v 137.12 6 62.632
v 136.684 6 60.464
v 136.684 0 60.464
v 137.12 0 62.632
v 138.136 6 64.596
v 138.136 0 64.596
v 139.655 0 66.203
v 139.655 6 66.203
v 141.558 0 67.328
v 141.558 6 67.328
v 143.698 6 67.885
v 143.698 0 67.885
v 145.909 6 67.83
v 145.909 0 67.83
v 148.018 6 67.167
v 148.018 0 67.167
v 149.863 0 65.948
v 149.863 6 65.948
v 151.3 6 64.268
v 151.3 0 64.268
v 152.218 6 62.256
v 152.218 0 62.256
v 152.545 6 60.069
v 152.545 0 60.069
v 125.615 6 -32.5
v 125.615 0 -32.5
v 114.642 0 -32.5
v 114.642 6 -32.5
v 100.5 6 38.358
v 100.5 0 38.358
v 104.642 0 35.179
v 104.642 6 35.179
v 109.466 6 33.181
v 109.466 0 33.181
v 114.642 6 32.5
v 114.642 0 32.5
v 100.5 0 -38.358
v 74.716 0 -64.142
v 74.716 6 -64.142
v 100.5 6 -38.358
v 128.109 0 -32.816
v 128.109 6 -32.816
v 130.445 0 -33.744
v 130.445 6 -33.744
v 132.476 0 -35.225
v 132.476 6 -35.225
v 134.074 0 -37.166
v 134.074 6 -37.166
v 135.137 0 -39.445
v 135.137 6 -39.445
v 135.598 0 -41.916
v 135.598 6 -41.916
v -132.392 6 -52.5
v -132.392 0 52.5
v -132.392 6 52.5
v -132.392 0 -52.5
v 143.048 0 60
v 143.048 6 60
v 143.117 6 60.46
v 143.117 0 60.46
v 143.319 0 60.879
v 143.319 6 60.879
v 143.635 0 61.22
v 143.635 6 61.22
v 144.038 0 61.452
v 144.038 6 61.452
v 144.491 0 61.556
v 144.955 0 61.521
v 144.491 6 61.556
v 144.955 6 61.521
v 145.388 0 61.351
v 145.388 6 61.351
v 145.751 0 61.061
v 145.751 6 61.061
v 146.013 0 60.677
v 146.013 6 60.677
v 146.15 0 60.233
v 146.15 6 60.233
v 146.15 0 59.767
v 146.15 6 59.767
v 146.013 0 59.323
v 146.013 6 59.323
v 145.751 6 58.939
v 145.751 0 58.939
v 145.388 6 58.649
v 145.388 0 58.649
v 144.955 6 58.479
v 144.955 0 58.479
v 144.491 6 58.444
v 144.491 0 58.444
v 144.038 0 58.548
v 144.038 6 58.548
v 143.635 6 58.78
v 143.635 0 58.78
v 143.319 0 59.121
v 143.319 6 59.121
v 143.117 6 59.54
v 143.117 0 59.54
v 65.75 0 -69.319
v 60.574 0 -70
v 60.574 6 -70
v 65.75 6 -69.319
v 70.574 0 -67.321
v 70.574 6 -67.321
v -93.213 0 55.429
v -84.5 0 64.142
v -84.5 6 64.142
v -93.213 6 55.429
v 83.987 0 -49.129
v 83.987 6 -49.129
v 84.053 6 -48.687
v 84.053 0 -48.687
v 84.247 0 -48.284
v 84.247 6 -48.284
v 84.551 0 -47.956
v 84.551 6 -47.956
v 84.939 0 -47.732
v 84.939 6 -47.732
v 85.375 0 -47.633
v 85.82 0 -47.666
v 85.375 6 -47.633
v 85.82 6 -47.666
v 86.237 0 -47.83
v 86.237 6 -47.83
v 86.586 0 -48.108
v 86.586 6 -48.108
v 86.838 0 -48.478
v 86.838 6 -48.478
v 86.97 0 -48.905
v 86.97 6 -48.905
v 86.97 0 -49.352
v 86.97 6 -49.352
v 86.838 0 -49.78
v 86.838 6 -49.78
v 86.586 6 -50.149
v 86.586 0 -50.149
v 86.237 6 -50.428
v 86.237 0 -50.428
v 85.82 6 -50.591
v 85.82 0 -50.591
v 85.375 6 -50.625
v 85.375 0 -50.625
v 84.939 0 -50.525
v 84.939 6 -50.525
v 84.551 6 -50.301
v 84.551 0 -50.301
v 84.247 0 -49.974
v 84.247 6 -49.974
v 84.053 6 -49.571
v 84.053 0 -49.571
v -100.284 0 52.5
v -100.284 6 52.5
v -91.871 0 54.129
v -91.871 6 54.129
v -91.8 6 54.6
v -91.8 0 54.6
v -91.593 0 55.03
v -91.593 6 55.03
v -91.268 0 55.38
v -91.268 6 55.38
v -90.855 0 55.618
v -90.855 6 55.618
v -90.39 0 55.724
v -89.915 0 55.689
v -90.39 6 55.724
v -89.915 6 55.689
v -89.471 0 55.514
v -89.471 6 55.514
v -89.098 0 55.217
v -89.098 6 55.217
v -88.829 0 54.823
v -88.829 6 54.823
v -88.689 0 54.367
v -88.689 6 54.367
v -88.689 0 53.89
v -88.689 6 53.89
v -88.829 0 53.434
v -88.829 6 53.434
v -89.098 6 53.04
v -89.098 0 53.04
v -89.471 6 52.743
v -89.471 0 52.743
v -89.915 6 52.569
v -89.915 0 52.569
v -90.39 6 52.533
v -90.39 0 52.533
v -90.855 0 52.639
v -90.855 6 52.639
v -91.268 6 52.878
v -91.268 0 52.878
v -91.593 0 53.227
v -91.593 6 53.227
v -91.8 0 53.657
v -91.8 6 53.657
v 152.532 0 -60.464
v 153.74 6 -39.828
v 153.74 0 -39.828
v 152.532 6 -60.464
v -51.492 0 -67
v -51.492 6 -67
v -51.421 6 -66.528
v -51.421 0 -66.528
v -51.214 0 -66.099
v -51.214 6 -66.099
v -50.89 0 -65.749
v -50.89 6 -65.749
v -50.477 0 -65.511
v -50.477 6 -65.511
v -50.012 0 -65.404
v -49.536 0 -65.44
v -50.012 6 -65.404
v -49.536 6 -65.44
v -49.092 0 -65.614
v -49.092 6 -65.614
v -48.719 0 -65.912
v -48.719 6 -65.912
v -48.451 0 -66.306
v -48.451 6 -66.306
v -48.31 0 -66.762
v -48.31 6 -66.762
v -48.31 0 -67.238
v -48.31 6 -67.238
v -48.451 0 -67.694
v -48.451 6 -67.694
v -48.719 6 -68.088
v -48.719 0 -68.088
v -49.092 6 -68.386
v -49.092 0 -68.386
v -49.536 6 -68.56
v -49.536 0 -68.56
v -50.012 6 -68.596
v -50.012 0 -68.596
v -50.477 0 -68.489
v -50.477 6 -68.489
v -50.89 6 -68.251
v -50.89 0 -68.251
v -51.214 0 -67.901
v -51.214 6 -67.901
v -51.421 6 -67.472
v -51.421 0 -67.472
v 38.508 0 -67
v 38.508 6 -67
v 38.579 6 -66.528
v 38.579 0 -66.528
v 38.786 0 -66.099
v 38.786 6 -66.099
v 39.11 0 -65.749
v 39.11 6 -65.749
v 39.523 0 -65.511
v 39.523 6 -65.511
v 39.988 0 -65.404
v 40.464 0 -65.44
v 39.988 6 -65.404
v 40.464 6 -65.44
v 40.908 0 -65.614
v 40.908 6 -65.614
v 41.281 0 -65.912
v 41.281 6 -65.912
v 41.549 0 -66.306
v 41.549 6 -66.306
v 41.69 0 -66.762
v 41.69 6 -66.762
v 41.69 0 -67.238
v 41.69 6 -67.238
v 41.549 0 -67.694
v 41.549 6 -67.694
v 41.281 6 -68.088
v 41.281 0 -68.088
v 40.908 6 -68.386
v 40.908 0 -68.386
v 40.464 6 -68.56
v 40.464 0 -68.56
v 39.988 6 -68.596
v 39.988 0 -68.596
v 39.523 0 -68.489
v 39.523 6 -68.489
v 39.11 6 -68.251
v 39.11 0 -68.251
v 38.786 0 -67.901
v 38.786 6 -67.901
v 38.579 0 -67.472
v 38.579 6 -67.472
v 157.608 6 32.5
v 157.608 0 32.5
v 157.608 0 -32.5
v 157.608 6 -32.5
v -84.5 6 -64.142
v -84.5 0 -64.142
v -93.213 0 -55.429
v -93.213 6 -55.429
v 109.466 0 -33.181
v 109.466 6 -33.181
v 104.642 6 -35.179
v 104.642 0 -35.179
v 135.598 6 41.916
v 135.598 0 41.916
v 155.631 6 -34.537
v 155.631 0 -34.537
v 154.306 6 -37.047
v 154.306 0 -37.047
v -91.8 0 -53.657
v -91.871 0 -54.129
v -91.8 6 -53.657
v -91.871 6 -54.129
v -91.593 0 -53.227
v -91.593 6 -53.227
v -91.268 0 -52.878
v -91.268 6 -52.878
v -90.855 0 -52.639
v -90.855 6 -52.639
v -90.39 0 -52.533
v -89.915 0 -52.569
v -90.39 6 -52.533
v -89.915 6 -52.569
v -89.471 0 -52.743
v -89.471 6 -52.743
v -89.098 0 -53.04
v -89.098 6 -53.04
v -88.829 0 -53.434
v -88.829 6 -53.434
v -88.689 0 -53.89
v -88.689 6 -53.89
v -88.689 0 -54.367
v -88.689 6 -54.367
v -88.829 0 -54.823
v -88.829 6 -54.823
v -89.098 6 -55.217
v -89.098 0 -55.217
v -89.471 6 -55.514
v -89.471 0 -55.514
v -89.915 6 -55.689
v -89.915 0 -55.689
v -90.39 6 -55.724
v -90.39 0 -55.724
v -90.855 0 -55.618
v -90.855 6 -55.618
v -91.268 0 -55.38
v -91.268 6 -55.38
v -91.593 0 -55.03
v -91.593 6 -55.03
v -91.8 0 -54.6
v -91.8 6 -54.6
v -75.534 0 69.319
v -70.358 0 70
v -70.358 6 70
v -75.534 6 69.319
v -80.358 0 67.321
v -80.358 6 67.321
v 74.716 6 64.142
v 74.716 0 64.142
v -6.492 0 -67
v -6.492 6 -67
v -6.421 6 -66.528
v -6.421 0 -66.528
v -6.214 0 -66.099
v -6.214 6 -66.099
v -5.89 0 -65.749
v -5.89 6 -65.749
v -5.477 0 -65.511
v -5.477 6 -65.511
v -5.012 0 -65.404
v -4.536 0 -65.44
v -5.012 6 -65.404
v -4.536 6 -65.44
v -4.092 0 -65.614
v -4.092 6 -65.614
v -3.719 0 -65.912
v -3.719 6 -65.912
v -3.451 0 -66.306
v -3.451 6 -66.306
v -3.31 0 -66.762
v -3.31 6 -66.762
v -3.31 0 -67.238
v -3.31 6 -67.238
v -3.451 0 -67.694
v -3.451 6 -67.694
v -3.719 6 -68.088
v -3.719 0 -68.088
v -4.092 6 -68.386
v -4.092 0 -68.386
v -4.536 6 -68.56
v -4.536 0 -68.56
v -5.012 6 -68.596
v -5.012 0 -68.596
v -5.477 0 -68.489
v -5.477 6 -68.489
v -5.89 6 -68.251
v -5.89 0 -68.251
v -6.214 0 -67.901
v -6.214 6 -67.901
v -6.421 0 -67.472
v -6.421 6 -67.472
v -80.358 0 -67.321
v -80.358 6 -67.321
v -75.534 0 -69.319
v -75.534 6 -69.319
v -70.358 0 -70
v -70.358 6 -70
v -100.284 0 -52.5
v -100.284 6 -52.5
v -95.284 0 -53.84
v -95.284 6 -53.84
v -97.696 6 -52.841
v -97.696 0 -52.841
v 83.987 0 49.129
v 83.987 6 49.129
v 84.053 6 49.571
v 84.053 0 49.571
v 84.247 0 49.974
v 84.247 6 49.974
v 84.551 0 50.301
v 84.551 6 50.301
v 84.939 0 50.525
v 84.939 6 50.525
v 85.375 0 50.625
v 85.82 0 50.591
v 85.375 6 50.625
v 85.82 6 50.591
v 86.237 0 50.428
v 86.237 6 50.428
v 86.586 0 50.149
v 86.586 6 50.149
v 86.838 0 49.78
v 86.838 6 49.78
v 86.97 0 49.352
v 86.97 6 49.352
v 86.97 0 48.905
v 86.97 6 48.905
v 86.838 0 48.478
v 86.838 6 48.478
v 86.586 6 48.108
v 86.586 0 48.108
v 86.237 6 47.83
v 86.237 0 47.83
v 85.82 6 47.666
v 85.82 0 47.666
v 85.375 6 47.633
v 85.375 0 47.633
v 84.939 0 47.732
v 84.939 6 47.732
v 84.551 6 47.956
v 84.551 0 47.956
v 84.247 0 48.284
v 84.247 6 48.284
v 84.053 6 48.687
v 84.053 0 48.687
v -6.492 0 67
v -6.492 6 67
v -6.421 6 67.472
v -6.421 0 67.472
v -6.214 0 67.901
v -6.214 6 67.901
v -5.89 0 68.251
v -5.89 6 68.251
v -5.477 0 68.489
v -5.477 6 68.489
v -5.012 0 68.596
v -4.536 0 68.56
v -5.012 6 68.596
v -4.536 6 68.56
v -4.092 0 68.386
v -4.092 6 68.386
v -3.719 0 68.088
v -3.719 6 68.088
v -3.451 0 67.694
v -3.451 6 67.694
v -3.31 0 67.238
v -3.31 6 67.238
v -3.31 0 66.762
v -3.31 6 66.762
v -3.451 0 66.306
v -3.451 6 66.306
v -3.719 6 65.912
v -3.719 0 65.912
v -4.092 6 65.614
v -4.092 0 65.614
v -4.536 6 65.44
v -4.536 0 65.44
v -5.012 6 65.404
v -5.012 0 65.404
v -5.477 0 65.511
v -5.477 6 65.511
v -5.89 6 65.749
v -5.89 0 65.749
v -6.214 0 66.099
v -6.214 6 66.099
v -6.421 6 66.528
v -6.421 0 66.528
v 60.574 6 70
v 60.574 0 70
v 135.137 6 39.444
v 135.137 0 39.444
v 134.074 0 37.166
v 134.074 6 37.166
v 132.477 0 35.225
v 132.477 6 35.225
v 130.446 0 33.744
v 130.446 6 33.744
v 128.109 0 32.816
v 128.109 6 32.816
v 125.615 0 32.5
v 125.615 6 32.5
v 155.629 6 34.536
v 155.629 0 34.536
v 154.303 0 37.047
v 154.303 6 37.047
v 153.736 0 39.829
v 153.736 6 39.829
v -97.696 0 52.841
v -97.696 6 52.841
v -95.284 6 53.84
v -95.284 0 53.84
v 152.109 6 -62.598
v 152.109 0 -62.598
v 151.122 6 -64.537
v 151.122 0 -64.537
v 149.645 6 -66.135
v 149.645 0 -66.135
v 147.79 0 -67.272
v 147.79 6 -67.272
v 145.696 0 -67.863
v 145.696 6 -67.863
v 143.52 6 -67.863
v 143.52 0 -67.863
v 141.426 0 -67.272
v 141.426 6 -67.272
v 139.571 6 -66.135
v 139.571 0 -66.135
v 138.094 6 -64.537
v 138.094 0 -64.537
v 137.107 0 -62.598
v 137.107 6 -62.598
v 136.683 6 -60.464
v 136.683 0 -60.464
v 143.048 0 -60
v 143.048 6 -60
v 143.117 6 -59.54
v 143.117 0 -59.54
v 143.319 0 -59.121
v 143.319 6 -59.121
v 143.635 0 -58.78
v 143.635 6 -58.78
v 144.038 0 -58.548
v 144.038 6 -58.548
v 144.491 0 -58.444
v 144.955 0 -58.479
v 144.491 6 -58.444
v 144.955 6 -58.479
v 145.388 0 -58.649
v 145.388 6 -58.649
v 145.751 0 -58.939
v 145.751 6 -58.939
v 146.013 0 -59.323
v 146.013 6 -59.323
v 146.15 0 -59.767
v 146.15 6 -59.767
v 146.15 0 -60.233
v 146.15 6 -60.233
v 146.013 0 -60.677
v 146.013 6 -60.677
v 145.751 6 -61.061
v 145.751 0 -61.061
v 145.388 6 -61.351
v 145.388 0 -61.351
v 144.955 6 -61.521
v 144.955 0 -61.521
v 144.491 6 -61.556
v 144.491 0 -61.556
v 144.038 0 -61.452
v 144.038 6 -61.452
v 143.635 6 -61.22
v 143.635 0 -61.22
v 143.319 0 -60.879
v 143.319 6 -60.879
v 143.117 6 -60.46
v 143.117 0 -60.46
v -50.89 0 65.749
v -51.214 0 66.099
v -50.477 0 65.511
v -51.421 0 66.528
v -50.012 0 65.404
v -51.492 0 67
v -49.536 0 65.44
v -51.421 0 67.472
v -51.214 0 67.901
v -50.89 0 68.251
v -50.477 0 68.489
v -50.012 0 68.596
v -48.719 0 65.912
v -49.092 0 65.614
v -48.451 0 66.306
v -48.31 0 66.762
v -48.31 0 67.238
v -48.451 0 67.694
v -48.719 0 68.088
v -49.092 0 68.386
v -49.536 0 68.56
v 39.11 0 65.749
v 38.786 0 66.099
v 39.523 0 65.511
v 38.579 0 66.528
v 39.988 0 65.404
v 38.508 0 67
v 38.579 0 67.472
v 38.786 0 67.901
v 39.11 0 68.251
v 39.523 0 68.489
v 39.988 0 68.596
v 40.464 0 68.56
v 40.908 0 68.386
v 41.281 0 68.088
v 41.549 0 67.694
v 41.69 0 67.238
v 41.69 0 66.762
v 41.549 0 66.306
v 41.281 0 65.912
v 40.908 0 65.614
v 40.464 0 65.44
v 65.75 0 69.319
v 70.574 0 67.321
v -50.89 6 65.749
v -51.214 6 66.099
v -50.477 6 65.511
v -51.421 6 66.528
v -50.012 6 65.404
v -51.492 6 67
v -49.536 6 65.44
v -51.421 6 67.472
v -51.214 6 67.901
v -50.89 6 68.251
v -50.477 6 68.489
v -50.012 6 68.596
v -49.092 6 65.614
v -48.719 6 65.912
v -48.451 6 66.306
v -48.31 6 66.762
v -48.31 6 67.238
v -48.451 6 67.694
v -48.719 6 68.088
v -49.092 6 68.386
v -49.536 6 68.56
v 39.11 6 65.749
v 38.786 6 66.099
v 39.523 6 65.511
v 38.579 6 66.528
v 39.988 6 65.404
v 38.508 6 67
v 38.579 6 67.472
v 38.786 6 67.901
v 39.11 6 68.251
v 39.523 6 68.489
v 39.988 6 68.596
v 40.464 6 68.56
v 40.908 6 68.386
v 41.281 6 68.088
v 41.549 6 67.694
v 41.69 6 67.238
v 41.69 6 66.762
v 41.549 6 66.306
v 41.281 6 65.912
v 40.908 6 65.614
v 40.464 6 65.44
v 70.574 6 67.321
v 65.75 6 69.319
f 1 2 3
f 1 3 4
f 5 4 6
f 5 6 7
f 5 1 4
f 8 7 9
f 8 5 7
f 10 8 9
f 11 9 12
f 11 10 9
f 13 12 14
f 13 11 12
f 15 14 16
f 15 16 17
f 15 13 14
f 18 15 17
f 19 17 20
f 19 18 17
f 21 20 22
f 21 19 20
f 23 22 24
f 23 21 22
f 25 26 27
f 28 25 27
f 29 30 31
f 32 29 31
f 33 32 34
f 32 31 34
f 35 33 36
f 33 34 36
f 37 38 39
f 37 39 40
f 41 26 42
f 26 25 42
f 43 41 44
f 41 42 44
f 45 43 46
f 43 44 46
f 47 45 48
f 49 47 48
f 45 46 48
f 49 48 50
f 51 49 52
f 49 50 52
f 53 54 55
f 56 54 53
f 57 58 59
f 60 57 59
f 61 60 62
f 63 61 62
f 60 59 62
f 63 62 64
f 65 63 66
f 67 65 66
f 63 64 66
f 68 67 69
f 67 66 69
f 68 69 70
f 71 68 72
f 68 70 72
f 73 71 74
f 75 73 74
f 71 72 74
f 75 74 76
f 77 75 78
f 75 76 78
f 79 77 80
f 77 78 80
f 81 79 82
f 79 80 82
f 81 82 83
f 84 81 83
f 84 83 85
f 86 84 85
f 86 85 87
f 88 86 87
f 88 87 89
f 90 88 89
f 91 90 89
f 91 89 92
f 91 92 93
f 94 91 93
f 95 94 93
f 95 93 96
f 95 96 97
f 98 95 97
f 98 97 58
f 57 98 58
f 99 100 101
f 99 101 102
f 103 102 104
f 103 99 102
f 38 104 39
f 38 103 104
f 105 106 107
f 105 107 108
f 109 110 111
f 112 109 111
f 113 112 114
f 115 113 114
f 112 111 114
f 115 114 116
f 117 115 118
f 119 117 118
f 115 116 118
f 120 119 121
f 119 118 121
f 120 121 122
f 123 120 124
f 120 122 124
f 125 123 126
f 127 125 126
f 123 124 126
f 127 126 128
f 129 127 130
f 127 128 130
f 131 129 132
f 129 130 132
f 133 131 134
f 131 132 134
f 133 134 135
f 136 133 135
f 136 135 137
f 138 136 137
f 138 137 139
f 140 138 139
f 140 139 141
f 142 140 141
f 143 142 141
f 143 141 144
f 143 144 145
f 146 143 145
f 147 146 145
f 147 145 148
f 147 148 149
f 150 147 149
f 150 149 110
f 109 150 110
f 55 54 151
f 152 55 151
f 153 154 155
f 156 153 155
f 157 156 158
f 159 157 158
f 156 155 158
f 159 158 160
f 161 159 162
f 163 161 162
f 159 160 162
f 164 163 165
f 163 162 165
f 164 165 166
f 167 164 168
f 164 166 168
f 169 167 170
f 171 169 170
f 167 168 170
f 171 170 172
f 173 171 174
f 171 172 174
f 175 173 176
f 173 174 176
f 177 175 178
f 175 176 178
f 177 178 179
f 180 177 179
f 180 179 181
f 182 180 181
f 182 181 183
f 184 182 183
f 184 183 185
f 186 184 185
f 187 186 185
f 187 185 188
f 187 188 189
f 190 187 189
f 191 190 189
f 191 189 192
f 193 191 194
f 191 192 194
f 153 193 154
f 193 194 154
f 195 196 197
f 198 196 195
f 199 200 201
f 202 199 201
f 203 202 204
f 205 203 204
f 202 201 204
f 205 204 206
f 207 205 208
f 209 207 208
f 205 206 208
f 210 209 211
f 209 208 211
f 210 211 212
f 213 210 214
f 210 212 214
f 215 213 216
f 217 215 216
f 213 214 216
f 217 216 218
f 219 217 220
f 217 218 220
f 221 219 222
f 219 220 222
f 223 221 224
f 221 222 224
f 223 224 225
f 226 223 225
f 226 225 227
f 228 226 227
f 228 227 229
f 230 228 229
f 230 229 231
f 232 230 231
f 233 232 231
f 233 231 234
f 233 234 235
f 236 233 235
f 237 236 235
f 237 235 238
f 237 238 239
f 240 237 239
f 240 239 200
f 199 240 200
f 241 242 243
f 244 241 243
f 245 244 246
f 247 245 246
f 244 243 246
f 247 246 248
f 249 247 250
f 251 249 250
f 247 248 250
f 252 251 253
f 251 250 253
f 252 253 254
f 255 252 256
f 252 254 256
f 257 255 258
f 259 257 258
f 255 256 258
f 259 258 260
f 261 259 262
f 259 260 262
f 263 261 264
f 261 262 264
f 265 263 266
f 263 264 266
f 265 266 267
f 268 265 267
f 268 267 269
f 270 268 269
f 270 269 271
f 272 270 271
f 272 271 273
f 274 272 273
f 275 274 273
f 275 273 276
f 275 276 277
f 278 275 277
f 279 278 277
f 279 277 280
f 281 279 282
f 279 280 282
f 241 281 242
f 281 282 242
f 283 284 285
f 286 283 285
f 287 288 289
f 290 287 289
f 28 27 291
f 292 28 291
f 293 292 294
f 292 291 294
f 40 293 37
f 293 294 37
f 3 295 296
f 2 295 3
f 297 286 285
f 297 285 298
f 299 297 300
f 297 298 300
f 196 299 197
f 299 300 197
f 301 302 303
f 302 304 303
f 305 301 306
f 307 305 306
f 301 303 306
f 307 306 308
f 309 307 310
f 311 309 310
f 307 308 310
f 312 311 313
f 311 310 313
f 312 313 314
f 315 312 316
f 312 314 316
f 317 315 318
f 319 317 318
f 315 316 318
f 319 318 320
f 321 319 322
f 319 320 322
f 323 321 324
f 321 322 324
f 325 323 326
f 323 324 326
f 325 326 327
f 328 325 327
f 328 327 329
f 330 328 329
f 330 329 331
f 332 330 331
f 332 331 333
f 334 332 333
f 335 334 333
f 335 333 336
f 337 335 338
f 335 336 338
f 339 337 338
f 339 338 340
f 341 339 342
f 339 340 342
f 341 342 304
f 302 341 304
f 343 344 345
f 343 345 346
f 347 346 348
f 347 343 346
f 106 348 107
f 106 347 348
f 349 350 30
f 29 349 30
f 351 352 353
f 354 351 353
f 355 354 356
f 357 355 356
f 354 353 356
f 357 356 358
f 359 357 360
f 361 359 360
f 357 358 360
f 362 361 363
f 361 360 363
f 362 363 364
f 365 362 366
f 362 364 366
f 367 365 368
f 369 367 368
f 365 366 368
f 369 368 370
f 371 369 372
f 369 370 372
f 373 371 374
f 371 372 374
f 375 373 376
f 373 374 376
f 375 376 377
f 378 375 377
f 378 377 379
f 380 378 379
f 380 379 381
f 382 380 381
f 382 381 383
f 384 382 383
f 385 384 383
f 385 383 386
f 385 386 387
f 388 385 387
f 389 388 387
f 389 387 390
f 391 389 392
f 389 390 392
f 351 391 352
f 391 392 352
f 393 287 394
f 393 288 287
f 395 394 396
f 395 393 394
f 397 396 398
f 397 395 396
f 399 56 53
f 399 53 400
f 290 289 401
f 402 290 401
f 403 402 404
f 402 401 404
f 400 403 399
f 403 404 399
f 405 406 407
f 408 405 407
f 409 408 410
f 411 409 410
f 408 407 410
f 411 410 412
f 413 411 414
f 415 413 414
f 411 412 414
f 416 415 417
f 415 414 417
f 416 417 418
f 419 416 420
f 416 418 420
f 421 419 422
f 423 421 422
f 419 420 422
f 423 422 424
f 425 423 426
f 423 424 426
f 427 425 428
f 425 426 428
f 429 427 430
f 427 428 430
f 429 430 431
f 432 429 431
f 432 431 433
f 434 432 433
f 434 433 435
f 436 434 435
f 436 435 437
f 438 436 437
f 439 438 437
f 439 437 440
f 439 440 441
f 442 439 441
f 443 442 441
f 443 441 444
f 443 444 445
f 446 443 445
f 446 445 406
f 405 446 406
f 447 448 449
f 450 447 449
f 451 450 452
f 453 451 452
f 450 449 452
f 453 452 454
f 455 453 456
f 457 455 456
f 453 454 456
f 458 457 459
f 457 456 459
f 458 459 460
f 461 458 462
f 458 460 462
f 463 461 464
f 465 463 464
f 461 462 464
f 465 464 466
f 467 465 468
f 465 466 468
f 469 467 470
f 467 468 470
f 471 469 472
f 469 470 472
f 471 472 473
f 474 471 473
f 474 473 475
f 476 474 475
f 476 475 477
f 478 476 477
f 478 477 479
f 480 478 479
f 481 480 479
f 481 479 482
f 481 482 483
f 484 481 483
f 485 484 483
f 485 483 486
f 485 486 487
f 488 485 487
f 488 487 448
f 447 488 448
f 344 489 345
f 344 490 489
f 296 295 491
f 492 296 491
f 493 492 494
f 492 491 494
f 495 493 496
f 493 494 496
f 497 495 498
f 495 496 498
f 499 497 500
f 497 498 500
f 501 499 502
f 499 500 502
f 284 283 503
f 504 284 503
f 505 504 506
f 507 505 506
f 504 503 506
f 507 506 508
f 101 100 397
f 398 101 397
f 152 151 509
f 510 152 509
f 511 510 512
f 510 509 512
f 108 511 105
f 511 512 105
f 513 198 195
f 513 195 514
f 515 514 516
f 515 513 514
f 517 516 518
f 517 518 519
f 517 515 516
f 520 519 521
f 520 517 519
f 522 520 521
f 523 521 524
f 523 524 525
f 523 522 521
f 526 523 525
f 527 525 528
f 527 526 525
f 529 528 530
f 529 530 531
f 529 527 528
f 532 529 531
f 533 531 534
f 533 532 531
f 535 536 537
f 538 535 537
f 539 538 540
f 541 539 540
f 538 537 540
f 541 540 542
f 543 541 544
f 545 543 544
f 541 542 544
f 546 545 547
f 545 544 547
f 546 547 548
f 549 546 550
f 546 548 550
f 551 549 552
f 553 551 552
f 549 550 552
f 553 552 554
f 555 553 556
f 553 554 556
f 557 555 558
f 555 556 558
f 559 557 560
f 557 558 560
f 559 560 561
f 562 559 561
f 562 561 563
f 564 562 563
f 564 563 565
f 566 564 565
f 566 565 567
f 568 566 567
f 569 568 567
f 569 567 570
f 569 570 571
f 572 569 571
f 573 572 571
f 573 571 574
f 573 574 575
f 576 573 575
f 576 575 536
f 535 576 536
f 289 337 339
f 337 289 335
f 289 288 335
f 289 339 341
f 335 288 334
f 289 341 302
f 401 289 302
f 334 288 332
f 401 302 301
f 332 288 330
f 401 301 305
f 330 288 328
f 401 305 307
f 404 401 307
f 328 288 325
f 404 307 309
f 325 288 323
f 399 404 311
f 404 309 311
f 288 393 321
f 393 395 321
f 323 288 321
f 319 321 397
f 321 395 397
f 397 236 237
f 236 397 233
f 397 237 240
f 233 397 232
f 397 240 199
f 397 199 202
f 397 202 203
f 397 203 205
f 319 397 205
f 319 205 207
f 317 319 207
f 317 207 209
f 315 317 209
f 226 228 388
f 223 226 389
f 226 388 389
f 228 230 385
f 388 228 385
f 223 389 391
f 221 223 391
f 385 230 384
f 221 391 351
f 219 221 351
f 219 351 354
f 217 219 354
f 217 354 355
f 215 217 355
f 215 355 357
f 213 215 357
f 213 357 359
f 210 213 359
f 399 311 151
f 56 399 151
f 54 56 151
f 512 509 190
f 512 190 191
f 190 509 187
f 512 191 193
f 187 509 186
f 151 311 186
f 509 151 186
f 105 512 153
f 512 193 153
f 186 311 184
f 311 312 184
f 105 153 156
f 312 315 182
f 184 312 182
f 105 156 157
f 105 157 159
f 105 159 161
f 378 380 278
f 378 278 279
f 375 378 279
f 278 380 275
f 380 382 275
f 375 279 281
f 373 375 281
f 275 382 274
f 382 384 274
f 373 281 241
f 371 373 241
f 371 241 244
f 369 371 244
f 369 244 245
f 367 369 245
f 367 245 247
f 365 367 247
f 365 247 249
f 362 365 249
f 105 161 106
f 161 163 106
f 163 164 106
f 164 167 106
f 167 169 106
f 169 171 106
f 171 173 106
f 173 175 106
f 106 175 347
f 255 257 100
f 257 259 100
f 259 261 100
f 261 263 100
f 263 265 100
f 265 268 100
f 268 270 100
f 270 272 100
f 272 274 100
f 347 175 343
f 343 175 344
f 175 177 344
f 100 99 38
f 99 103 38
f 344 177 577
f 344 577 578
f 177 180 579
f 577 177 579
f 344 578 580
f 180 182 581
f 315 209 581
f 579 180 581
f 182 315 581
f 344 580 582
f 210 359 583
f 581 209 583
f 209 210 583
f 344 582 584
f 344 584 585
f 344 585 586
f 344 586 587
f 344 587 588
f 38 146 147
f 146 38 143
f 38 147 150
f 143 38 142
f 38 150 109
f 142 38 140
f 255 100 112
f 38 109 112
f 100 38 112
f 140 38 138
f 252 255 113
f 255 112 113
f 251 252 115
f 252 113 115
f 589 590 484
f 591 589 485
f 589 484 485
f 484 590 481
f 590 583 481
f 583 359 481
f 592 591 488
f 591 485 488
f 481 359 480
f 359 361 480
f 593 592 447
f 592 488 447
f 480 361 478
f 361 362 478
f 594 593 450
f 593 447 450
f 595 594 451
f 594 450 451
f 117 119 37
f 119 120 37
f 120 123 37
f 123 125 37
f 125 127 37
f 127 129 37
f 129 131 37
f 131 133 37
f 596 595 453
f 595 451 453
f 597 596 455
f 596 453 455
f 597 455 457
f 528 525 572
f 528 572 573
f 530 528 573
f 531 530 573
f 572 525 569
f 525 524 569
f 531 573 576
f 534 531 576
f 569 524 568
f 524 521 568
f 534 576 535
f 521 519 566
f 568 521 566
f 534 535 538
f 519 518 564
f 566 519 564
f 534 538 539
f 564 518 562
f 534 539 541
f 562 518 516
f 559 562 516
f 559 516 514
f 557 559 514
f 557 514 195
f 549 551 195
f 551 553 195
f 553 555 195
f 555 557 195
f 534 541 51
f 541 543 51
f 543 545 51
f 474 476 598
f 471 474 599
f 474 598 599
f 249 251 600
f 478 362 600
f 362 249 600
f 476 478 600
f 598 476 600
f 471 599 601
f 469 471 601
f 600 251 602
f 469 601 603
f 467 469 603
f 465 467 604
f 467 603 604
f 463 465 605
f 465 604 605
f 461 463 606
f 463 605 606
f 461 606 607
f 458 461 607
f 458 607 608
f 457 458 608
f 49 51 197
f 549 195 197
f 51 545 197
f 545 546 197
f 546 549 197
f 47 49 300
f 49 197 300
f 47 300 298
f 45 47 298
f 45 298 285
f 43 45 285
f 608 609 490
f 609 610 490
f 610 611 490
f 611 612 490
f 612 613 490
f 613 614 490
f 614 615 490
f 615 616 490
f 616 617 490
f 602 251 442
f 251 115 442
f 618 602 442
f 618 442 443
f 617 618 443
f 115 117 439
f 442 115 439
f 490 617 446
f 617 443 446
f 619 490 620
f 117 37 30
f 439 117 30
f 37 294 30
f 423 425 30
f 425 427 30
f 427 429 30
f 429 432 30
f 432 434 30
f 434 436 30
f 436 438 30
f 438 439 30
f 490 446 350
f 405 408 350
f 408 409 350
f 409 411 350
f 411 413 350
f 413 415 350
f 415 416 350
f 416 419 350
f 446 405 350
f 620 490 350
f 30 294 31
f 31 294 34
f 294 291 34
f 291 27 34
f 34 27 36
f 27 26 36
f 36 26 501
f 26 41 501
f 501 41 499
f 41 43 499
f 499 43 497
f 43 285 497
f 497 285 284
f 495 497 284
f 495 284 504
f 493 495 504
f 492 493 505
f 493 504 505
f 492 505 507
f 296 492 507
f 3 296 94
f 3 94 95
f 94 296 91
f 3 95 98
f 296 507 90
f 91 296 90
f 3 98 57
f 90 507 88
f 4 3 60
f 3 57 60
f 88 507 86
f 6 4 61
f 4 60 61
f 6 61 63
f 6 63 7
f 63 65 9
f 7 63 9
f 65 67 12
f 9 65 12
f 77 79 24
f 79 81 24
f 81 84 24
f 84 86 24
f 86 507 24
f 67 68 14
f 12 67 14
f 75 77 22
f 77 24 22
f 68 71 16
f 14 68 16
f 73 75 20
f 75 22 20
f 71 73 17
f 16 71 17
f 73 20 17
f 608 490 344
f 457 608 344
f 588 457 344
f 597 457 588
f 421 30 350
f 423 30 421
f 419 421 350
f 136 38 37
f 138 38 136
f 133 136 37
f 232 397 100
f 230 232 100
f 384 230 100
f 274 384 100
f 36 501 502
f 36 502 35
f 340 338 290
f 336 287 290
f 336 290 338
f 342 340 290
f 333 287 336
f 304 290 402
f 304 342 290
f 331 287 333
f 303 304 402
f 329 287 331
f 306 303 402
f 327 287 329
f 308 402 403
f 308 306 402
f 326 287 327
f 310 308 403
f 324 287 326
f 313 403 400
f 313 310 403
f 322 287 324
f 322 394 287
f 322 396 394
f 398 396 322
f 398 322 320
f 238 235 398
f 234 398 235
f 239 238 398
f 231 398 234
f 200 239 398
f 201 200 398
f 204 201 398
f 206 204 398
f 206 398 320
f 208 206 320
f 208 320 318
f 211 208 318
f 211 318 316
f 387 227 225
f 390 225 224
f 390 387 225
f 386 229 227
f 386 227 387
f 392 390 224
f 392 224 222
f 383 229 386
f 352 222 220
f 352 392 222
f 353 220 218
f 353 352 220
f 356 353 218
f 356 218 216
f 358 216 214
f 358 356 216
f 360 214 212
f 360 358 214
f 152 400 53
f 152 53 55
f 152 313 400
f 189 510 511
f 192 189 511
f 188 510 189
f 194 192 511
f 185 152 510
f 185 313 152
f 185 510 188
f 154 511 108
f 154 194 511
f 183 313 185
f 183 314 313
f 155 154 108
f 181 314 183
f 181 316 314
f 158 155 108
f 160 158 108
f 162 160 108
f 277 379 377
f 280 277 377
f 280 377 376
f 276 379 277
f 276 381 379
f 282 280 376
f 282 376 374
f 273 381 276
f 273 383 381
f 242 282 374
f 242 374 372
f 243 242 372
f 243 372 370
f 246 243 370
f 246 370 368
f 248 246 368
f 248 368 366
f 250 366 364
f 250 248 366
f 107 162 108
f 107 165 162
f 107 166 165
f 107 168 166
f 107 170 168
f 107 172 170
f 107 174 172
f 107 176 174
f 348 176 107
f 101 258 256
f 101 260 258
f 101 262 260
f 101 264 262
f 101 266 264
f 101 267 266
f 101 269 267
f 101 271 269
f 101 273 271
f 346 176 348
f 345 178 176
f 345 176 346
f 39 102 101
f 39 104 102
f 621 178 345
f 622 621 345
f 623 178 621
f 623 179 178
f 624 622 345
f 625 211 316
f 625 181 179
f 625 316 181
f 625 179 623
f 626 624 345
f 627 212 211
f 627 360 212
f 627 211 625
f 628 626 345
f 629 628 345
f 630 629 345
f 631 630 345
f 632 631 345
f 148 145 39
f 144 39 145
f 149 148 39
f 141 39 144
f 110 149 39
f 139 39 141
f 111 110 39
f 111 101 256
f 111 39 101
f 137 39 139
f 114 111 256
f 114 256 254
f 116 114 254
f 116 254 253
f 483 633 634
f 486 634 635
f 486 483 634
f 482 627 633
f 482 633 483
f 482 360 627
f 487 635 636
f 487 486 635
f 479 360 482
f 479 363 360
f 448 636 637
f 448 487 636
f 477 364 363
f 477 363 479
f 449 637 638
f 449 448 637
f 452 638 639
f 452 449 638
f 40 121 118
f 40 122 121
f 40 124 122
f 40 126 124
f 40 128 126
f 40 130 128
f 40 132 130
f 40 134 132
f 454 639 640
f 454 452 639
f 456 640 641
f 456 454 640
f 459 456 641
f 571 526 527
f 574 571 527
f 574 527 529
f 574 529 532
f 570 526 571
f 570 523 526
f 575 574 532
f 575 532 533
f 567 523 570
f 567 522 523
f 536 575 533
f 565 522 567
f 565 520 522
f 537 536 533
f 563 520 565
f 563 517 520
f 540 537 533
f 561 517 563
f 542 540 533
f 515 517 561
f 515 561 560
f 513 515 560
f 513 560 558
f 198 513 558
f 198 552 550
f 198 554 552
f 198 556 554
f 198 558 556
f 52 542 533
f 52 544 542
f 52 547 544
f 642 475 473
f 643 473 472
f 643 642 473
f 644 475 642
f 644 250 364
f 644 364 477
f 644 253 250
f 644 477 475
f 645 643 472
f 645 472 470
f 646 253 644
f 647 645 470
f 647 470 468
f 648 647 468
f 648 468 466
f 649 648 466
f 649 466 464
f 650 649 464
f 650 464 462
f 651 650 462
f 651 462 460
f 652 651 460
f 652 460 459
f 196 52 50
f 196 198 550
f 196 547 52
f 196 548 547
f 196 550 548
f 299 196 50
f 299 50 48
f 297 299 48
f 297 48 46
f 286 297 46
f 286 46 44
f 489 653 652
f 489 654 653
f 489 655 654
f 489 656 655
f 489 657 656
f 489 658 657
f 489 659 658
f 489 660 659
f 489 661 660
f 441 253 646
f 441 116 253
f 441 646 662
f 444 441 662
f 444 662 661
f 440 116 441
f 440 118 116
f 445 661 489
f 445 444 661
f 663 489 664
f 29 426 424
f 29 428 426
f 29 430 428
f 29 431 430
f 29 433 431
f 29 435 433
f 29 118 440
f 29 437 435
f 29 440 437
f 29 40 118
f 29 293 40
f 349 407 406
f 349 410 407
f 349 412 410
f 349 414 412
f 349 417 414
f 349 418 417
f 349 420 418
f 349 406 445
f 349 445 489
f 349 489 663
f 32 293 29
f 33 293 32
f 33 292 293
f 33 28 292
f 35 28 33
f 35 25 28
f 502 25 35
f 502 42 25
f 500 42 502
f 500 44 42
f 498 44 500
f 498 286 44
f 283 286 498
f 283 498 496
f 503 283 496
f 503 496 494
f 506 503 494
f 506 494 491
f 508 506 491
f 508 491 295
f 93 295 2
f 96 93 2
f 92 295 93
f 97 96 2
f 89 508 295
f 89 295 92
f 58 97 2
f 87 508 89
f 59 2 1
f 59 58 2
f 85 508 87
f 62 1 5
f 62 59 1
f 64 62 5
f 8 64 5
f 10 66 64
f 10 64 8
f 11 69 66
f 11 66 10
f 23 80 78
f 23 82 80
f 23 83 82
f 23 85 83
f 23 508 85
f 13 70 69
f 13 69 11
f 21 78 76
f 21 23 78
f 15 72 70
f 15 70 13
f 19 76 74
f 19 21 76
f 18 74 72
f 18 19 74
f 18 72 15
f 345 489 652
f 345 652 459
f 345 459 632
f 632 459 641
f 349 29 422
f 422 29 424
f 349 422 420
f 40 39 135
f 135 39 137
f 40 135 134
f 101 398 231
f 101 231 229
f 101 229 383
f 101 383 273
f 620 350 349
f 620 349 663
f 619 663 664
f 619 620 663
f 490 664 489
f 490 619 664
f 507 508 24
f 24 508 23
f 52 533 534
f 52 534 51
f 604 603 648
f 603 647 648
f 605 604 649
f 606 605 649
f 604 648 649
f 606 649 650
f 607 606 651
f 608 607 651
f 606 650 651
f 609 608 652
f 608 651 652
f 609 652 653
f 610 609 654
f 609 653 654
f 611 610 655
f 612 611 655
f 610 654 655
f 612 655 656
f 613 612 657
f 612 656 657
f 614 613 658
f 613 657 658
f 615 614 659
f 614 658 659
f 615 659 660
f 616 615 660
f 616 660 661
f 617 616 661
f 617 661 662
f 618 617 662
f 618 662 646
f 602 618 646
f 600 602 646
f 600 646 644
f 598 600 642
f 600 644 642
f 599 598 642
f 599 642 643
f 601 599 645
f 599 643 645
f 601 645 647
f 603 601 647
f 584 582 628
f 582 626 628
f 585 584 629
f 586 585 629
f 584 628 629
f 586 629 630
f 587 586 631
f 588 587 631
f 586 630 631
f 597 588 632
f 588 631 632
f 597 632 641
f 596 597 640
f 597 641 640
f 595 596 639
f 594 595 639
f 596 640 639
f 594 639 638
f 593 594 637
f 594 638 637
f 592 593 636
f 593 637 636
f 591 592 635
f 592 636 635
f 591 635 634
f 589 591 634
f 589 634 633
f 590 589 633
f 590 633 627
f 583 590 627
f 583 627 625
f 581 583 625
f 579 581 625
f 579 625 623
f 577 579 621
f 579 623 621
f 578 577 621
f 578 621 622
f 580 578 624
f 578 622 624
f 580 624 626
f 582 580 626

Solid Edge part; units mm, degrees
sketch "Sketch1" plane through (0, 0, 0) normal (0, -1, 0) x (1, 0, 0)
  line L0 (74.7158, 64.1421) -> (100.5001, 38.3579)
  arc A0 (100.5001, 38.3579) -> (114.6422, 32.5) centre (114.6422, 52.5) ccw
  line L1 (157.6079, 32.5) -> (114.6422, 32.5)
  line L2 (157.6079, 32.5) -> (157.6079, -32.5)
  line L3 (157.6079, -32.5) -> (114.6422, -32.5)
  arc A1 (100.5001, -38.3579) -> (114.6422, -32.5) centre (114.6422, -52.5) cw
  line L4 (74.7158, -64.1421) -> (100.5001, -38.3579)
  arc A2 (60.5737, -70) -> (74.7158, -64.1421) centre (60.5737, -50) ccw
  line L5 (60.5737, -70) -> (-70.3578, -70)
  arc A3 (-84.4999, -64.1421) -> (-70.3578, -70) centre (-70.3578, -50) ccw
  line L6 (-84.4999, -64.1421) -> (-93.2131, -55.4289)
  arc A4 (-100.2842, -52.5) -> (-93.2131, -55.4289) centre (-100.2842, -62.5) cw
  line L7 (-132.3921, -52.5) -> (-100.2842, -52.5)
  line L8 (-132.3921, 52.5) -> (-132.3921, -52.5)
  line L9 (-132.3921, 52.5) -> (-100.2842, 52.5)
  arc A5 (-100.2842, 52.5) -> (-93.2131, 55.4289) centre (-100.2842, 62.5) ccw
  line L10 (-84.4999, 64.1421) -> (-93.2131, 55.4289)
  arc A6 (-84.4999, 64.1421) -> (-70.3578, 70) centre (-70.3578, 50) cw
  line L11 (60.5737, 70) -> (-70.3578, 70)
  arc A7 (60.5737, 70) -> (74.7158, 64.1421) centre (60.5737, 50) cw
extrude "Protrusion1" add sketch "Sketch1" against normal blind 6
sketch "Sketch2" plane through (-2.3921, 6, 0) normal (0, 1, 0) x (-1, 0, 0)
  circle A0 centre (-87.8787, 49.1287) radius 1.5
  circle A1 centre (2.5, 67) radius 1.6
  circle A2 centre (-42.5, 67) radius 1.6
  circle A3 centre (47.5, 67) radius 1.6
  circle A4 centre (87.8787, 54.1287) radius 1.6
  circle A5 centre (-87.8787, -49.1287) radius 1.5
  circle A6 centre (2.5, -67) radius 1.6
  circle A7 centre (-42.5, -67) radius 1.6
  circle A8 centre (47.5, -67) radius 1.6
  circle A9 centre (87.8787, -54.1287) radius 1.6
extrude "ExtrudedCutout_2" cut sketch "Sketch2" along normal mid plane 140
sketch "Sketch3" plane through (-2.3921, 6, 0) normal (0, 1, 0) x (-1, 0, 0)
  circle A0 centre (-147, 60) radius 1.56
  line L0 (-157, -25) -> (-154.9246, -60.4638)
  line L1 (-139.0754, -60.4638) -> (-137, -25)
  line L2 (-157, -25) -> (-137, -25)
  arc A1 (-154.9246, -60.4638) -> (-139.0754, -60.4638) centre (-147, -60) ccw
  circle A2 centre (-147, -60) radius 1.56
  line L3 (-137, 25) -> (-139.0762, 60.4639)
  line L4 (-157, 25) -> (-154.9371, 60.069)
  line L5 (-157, 25) -> (-137, 25)
  arc A3 (-139.0762, 60.4639) -> (-154.9371, 60.069) centre (-147, 60) ccw
extrude "ExtrudedProtrusion_4" add sketch "Sketch3" against normal blind 6
fillet "Round_3" radius 10 4 edges at (154.169, 3, -32.5) (135.0468, 3, -32.5) (154.1667, 3, 32.5) (135.047, 3, 32.5)
